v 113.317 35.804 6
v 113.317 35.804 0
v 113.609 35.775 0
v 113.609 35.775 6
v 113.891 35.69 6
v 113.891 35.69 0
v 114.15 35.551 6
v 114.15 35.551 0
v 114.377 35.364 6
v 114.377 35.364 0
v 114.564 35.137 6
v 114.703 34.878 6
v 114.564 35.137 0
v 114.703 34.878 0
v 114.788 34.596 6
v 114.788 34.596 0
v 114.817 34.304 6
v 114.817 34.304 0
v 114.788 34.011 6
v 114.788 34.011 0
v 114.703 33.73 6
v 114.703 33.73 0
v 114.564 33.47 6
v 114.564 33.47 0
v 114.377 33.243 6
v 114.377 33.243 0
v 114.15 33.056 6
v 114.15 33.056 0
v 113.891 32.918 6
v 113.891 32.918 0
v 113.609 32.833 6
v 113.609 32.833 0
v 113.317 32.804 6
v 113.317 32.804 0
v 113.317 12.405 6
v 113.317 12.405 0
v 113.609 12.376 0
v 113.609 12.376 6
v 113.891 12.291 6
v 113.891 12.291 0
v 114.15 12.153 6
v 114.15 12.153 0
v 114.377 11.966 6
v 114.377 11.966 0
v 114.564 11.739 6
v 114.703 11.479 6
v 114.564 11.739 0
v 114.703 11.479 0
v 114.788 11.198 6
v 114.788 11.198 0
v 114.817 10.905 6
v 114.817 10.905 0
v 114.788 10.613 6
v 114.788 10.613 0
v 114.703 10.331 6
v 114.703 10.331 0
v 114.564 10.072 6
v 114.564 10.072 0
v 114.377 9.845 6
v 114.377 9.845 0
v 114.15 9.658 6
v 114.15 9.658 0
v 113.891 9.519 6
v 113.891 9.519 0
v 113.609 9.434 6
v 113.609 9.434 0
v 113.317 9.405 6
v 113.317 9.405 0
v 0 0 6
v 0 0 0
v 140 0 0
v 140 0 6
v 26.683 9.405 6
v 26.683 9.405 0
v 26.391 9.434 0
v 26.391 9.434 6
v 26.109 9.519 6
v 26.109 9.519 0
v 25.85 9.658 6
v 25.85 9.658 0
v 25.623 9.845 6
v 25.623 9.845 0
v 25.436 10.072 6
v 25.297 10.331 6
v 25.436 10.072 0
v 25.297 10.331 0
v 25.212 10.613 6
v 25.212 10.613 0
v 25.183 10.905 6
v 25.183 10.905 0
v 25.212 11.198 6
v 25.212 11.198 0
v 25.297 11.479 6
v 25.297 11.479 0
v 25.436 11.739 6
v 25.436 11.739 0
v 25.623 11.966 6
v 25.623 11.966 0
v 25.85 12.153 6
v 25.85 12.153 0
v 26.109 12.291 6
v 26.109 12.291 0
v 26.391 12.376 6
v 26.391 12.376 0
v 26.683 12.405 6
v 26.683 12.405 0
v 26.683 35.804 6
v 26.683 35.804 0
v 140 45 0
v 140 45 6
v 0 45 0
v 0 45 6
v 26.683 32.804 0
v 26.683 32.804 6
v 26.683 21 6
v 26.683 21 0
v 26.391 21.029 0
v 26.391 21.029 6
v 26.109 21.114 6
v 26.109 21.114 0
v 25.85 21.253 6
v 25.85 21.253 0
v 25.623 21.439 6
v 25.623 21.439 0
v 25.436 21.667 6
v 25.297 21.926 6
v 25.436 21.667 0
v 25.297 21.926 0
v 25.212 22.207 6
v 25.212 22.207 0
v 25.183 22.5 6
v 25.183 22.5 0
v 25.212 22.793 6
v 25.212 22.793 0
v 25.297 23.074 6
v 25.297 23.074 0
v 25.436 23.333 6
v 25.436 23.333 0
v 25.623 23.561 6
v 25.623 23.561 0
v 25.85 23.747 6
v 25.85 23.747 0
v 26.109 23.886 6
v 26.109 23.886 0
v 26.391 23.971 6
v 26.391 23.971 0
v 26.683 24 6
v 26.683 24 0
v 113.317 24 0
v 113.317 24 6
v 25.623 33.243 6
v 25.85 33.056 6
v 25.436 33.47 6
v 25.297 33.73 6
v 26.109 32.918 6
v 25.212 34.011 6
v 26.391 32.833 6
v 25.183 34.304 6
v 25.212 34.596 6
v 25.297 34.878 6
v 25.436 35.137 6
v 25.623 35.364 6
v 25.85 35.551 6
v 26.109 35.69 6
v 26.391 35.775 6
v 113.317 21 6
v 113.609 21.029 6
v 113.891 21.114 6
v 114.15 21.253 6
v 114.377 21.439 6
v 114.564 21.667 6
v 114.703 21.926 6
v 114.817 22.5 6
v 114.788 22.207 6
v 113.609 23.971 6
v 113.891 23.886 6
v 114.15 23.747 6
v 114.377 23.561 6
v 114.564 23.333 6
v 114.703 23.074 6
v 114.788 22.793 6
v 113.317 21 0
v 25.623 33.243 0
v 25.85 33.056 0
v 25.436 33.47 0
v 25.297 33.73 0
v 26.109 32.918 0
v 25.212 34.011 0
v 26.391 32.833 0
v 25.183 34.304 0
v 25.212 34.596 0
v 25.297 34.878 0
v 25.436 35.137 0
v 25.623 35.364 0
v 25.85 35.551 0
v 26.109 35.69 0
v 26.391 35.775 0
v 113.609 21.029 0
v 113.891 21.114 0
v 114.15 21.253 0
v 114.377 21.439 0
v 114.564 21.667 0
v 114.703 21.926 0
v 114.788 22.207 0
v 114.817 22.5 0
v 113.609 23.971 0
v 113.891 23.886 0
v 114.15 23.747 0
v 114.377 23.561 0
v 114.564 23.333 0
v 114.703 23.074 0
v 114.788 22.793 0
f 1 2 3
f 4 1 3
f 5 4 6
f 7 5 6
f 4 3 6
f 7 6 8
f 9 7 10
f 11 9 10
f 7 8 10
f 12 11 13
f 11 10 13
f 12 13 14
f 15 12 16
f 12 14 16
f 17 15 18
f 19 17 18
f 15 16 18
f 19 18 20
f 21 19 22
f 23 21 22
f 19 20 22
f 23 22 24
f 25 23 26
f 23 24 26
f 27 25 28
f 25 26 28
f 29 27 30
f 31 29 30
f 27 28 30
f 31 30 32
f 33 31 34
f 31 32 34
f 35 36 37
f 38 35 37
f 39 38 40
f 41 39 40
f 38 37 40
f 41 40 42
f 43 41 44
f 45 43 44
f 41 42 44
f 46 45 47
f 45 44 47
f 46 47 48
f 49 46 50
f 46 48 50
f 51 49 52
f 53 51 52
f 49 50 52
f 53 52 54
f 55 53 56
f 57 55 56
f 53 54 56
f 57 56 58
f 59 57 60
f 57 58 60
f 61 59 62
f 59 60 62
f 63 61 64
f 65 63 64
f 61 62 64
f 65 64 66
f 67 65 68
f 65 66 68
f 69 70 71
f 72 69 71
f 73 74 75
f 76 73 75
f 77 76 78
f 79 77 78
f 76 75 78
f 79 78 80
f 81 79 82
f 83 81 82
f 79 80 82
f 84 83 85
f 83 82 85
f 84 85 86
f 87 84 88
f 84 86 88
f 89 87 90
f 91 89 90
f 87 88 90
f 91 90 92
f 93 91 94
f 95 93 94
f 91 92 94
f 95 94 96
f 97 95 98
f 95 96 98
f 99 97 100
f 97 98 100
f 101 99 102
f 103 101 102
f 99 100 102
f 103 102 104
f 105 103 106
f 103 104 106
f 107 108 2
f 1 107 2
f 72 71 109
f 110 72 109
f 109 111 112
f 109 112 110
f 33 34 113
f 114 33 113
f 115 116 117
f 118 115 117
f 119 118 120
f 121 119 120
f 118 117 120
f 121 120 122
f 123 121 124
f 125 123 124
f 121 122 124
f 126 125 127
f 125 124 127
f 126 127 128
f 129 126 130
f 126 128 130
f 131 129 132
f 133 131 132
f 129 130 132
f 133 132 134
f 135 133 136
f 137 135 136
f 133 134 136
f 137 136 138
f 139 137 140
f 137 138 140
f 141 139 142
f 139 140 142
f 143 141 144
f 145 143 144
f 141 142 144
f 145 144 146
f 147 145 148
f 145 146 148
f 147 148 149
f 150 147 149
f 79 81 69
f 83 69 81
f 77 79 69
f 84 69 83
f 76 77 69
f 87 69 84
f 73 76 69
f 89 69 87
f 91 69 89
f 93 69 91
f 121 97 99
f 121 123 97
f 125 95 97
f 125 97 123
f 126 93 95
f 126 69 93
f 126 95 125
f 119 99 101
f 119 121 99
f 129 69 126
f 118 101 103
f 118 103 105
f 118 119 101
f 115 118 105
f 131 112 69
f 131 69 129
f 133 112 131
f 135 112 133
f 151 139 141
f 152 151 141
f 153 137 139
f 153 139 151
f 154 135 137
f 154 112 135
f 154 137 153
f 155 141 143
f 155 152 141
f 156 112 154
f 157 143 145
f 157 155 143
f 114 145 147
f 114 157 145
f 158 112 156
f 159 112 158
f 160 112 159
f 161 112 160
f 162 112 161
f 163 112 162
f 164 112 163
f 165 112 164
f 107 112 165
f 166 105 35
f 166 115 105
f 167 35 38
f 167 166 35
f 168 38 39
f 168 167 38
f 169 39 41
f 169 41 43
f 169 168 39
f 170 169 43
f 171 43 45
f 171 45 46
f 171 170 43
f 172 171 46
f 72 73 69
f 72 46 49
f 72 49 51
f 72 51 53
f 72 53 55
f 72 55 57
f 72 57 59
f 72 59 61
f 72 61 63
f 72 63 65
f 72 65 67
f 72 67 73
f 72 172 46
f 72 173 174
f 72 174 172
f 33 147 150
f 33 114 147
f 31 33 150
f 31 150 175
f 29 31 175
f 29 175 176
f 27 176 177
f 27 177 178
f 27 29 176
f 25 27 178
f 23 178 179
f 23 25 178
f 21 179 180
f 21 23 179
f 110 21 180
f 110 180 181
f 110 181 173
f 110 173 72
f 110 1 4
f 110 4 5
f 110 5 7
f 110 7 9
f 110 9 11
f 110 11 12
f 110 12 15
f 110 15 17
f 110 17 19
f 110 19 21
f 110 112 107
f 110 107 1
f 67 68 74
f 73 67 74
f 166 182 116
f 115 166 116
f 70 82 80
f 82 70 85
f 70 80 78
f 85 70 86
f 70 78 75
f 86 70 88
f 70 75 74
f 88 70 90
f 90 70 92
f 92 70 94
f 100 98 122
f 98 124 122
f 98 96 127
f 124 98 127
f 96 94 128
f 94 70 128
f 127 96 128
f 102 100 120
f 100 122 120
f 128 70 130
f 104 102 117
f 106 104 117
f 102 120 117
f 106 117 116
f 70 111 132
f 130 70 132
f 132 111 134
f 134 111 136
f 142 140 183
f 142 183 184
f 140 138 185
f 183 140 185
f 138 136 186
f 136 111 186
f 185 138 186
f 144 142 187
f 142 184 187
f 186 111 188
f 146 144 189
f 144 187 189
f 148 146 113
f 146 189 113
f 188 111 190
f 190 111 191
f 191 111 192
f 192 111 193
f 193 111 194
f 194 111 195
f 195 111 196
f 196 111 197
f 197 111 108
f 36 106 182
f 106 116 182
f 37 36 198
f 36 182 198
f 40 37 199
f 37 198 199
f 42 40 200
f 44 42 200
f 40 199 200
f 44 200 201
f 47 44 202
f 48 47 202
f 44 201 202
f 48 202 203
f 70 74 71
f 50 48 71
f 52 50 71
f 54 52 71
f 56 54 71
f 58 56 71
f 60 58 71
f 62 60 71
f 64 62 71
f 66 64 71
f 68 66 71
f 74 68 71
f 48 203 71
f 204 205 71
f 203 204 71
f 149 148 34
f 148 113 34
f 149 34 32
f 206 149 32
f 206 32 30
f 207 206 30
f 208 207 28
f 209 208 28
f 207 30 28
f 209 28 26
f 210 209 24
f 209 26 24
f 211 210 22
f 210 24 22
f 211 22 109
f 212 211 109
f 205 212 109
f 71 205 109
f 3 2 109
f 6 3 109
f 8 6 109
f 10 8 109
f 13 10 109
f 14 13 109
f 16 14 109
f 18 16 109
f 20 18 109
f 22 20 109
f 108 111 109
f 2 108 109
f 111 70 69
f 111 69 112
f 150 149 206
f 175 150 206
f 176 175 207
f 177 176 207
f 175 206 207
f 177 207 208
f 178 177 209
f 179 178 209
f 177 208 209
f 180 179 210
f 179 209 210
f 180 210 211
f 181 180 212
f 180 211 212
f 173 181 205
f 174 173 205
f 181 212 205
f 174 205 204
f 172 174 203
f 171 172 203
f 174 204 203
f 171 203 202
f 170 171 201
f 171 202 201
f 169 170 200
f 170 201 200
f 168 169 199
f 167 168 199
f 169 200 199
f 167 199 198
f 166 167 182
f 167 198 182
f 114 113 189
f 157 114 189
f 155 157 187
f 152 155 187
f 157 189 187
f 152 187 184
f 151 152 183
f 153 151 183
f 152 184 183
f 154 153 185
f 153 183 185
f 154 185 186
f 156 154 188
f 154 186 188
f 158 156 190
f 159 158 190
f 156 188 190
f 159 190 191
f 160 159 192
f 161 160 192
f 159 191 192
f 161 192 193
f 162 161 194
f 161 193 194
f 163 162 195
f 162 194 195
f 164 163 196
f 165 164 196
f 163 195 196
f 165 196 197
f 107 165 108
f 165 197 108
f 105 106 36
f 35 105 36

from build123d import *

# Parameters (mm, degrees)
SKETCH1_W           = 140
SKETCH1_H           = 45
BOSS_EXTRUDE1_DEPTH = 6


with BuildPart() as part:
    # Sketch1 → Boss-Extrude1 (new body)
    with BuildSketch(Plane.XY):
        with Locations((70, 22.5)):
            Rectangle(SKETCH1_W, SKETCH1_H)
        with BuildLine():
            Line((26.683203231, 24), (113.316796769, 24))
            ThreePointArc((113.316796769, 24), (114.816796769, 22.5), (113.316796769, 21))
            Line((113.316796769, 21), (26.683203231, 21))
            ThreePointArc((26.683203231, 21), (25.183203231, 22.5), (26.683203231, 24))
        make_face(mode=Mode.SUBTRACT)
        with BuildLine():
            Line((26.683203231, 35.803698148), (113.316796769, 35.803698148))
            ThreePointArc((113.316796769, 35.803698148), (114.816796769, 34.303698148), (113.316796769, 32.803698148))
            Line((113.316796769, 32.803698148), (26.683203231, 32.803698148))
            ThreePointArc((26.683203231, 32.803698148), (25.183203231, 34.303698148), (26.683203231, 35.803698148))
        make_face(mode=Mode.SUBTRACT)
        with BuildLine():
            Line((26.683203231, 12.405318703), (113.316796769, 12.405318703))
            ThreePointArc((113.316796769, 12.405318703), (114.816796769, 10.905318703), (113.316796769, 9.405318703))
            Line((113.316796769, 9.405318703), (26.683203231, 9.405318703))
            ThreePointArc((26.683203231, 9.405318703), (25.183203231, 10.905318703), (26.683203231, 12.405318703))
        make_face(mode=Mode.SUBTRACT)
    extrude(amount=BOSS_EXTRUDE1_DEPTH)


solid = part.part
